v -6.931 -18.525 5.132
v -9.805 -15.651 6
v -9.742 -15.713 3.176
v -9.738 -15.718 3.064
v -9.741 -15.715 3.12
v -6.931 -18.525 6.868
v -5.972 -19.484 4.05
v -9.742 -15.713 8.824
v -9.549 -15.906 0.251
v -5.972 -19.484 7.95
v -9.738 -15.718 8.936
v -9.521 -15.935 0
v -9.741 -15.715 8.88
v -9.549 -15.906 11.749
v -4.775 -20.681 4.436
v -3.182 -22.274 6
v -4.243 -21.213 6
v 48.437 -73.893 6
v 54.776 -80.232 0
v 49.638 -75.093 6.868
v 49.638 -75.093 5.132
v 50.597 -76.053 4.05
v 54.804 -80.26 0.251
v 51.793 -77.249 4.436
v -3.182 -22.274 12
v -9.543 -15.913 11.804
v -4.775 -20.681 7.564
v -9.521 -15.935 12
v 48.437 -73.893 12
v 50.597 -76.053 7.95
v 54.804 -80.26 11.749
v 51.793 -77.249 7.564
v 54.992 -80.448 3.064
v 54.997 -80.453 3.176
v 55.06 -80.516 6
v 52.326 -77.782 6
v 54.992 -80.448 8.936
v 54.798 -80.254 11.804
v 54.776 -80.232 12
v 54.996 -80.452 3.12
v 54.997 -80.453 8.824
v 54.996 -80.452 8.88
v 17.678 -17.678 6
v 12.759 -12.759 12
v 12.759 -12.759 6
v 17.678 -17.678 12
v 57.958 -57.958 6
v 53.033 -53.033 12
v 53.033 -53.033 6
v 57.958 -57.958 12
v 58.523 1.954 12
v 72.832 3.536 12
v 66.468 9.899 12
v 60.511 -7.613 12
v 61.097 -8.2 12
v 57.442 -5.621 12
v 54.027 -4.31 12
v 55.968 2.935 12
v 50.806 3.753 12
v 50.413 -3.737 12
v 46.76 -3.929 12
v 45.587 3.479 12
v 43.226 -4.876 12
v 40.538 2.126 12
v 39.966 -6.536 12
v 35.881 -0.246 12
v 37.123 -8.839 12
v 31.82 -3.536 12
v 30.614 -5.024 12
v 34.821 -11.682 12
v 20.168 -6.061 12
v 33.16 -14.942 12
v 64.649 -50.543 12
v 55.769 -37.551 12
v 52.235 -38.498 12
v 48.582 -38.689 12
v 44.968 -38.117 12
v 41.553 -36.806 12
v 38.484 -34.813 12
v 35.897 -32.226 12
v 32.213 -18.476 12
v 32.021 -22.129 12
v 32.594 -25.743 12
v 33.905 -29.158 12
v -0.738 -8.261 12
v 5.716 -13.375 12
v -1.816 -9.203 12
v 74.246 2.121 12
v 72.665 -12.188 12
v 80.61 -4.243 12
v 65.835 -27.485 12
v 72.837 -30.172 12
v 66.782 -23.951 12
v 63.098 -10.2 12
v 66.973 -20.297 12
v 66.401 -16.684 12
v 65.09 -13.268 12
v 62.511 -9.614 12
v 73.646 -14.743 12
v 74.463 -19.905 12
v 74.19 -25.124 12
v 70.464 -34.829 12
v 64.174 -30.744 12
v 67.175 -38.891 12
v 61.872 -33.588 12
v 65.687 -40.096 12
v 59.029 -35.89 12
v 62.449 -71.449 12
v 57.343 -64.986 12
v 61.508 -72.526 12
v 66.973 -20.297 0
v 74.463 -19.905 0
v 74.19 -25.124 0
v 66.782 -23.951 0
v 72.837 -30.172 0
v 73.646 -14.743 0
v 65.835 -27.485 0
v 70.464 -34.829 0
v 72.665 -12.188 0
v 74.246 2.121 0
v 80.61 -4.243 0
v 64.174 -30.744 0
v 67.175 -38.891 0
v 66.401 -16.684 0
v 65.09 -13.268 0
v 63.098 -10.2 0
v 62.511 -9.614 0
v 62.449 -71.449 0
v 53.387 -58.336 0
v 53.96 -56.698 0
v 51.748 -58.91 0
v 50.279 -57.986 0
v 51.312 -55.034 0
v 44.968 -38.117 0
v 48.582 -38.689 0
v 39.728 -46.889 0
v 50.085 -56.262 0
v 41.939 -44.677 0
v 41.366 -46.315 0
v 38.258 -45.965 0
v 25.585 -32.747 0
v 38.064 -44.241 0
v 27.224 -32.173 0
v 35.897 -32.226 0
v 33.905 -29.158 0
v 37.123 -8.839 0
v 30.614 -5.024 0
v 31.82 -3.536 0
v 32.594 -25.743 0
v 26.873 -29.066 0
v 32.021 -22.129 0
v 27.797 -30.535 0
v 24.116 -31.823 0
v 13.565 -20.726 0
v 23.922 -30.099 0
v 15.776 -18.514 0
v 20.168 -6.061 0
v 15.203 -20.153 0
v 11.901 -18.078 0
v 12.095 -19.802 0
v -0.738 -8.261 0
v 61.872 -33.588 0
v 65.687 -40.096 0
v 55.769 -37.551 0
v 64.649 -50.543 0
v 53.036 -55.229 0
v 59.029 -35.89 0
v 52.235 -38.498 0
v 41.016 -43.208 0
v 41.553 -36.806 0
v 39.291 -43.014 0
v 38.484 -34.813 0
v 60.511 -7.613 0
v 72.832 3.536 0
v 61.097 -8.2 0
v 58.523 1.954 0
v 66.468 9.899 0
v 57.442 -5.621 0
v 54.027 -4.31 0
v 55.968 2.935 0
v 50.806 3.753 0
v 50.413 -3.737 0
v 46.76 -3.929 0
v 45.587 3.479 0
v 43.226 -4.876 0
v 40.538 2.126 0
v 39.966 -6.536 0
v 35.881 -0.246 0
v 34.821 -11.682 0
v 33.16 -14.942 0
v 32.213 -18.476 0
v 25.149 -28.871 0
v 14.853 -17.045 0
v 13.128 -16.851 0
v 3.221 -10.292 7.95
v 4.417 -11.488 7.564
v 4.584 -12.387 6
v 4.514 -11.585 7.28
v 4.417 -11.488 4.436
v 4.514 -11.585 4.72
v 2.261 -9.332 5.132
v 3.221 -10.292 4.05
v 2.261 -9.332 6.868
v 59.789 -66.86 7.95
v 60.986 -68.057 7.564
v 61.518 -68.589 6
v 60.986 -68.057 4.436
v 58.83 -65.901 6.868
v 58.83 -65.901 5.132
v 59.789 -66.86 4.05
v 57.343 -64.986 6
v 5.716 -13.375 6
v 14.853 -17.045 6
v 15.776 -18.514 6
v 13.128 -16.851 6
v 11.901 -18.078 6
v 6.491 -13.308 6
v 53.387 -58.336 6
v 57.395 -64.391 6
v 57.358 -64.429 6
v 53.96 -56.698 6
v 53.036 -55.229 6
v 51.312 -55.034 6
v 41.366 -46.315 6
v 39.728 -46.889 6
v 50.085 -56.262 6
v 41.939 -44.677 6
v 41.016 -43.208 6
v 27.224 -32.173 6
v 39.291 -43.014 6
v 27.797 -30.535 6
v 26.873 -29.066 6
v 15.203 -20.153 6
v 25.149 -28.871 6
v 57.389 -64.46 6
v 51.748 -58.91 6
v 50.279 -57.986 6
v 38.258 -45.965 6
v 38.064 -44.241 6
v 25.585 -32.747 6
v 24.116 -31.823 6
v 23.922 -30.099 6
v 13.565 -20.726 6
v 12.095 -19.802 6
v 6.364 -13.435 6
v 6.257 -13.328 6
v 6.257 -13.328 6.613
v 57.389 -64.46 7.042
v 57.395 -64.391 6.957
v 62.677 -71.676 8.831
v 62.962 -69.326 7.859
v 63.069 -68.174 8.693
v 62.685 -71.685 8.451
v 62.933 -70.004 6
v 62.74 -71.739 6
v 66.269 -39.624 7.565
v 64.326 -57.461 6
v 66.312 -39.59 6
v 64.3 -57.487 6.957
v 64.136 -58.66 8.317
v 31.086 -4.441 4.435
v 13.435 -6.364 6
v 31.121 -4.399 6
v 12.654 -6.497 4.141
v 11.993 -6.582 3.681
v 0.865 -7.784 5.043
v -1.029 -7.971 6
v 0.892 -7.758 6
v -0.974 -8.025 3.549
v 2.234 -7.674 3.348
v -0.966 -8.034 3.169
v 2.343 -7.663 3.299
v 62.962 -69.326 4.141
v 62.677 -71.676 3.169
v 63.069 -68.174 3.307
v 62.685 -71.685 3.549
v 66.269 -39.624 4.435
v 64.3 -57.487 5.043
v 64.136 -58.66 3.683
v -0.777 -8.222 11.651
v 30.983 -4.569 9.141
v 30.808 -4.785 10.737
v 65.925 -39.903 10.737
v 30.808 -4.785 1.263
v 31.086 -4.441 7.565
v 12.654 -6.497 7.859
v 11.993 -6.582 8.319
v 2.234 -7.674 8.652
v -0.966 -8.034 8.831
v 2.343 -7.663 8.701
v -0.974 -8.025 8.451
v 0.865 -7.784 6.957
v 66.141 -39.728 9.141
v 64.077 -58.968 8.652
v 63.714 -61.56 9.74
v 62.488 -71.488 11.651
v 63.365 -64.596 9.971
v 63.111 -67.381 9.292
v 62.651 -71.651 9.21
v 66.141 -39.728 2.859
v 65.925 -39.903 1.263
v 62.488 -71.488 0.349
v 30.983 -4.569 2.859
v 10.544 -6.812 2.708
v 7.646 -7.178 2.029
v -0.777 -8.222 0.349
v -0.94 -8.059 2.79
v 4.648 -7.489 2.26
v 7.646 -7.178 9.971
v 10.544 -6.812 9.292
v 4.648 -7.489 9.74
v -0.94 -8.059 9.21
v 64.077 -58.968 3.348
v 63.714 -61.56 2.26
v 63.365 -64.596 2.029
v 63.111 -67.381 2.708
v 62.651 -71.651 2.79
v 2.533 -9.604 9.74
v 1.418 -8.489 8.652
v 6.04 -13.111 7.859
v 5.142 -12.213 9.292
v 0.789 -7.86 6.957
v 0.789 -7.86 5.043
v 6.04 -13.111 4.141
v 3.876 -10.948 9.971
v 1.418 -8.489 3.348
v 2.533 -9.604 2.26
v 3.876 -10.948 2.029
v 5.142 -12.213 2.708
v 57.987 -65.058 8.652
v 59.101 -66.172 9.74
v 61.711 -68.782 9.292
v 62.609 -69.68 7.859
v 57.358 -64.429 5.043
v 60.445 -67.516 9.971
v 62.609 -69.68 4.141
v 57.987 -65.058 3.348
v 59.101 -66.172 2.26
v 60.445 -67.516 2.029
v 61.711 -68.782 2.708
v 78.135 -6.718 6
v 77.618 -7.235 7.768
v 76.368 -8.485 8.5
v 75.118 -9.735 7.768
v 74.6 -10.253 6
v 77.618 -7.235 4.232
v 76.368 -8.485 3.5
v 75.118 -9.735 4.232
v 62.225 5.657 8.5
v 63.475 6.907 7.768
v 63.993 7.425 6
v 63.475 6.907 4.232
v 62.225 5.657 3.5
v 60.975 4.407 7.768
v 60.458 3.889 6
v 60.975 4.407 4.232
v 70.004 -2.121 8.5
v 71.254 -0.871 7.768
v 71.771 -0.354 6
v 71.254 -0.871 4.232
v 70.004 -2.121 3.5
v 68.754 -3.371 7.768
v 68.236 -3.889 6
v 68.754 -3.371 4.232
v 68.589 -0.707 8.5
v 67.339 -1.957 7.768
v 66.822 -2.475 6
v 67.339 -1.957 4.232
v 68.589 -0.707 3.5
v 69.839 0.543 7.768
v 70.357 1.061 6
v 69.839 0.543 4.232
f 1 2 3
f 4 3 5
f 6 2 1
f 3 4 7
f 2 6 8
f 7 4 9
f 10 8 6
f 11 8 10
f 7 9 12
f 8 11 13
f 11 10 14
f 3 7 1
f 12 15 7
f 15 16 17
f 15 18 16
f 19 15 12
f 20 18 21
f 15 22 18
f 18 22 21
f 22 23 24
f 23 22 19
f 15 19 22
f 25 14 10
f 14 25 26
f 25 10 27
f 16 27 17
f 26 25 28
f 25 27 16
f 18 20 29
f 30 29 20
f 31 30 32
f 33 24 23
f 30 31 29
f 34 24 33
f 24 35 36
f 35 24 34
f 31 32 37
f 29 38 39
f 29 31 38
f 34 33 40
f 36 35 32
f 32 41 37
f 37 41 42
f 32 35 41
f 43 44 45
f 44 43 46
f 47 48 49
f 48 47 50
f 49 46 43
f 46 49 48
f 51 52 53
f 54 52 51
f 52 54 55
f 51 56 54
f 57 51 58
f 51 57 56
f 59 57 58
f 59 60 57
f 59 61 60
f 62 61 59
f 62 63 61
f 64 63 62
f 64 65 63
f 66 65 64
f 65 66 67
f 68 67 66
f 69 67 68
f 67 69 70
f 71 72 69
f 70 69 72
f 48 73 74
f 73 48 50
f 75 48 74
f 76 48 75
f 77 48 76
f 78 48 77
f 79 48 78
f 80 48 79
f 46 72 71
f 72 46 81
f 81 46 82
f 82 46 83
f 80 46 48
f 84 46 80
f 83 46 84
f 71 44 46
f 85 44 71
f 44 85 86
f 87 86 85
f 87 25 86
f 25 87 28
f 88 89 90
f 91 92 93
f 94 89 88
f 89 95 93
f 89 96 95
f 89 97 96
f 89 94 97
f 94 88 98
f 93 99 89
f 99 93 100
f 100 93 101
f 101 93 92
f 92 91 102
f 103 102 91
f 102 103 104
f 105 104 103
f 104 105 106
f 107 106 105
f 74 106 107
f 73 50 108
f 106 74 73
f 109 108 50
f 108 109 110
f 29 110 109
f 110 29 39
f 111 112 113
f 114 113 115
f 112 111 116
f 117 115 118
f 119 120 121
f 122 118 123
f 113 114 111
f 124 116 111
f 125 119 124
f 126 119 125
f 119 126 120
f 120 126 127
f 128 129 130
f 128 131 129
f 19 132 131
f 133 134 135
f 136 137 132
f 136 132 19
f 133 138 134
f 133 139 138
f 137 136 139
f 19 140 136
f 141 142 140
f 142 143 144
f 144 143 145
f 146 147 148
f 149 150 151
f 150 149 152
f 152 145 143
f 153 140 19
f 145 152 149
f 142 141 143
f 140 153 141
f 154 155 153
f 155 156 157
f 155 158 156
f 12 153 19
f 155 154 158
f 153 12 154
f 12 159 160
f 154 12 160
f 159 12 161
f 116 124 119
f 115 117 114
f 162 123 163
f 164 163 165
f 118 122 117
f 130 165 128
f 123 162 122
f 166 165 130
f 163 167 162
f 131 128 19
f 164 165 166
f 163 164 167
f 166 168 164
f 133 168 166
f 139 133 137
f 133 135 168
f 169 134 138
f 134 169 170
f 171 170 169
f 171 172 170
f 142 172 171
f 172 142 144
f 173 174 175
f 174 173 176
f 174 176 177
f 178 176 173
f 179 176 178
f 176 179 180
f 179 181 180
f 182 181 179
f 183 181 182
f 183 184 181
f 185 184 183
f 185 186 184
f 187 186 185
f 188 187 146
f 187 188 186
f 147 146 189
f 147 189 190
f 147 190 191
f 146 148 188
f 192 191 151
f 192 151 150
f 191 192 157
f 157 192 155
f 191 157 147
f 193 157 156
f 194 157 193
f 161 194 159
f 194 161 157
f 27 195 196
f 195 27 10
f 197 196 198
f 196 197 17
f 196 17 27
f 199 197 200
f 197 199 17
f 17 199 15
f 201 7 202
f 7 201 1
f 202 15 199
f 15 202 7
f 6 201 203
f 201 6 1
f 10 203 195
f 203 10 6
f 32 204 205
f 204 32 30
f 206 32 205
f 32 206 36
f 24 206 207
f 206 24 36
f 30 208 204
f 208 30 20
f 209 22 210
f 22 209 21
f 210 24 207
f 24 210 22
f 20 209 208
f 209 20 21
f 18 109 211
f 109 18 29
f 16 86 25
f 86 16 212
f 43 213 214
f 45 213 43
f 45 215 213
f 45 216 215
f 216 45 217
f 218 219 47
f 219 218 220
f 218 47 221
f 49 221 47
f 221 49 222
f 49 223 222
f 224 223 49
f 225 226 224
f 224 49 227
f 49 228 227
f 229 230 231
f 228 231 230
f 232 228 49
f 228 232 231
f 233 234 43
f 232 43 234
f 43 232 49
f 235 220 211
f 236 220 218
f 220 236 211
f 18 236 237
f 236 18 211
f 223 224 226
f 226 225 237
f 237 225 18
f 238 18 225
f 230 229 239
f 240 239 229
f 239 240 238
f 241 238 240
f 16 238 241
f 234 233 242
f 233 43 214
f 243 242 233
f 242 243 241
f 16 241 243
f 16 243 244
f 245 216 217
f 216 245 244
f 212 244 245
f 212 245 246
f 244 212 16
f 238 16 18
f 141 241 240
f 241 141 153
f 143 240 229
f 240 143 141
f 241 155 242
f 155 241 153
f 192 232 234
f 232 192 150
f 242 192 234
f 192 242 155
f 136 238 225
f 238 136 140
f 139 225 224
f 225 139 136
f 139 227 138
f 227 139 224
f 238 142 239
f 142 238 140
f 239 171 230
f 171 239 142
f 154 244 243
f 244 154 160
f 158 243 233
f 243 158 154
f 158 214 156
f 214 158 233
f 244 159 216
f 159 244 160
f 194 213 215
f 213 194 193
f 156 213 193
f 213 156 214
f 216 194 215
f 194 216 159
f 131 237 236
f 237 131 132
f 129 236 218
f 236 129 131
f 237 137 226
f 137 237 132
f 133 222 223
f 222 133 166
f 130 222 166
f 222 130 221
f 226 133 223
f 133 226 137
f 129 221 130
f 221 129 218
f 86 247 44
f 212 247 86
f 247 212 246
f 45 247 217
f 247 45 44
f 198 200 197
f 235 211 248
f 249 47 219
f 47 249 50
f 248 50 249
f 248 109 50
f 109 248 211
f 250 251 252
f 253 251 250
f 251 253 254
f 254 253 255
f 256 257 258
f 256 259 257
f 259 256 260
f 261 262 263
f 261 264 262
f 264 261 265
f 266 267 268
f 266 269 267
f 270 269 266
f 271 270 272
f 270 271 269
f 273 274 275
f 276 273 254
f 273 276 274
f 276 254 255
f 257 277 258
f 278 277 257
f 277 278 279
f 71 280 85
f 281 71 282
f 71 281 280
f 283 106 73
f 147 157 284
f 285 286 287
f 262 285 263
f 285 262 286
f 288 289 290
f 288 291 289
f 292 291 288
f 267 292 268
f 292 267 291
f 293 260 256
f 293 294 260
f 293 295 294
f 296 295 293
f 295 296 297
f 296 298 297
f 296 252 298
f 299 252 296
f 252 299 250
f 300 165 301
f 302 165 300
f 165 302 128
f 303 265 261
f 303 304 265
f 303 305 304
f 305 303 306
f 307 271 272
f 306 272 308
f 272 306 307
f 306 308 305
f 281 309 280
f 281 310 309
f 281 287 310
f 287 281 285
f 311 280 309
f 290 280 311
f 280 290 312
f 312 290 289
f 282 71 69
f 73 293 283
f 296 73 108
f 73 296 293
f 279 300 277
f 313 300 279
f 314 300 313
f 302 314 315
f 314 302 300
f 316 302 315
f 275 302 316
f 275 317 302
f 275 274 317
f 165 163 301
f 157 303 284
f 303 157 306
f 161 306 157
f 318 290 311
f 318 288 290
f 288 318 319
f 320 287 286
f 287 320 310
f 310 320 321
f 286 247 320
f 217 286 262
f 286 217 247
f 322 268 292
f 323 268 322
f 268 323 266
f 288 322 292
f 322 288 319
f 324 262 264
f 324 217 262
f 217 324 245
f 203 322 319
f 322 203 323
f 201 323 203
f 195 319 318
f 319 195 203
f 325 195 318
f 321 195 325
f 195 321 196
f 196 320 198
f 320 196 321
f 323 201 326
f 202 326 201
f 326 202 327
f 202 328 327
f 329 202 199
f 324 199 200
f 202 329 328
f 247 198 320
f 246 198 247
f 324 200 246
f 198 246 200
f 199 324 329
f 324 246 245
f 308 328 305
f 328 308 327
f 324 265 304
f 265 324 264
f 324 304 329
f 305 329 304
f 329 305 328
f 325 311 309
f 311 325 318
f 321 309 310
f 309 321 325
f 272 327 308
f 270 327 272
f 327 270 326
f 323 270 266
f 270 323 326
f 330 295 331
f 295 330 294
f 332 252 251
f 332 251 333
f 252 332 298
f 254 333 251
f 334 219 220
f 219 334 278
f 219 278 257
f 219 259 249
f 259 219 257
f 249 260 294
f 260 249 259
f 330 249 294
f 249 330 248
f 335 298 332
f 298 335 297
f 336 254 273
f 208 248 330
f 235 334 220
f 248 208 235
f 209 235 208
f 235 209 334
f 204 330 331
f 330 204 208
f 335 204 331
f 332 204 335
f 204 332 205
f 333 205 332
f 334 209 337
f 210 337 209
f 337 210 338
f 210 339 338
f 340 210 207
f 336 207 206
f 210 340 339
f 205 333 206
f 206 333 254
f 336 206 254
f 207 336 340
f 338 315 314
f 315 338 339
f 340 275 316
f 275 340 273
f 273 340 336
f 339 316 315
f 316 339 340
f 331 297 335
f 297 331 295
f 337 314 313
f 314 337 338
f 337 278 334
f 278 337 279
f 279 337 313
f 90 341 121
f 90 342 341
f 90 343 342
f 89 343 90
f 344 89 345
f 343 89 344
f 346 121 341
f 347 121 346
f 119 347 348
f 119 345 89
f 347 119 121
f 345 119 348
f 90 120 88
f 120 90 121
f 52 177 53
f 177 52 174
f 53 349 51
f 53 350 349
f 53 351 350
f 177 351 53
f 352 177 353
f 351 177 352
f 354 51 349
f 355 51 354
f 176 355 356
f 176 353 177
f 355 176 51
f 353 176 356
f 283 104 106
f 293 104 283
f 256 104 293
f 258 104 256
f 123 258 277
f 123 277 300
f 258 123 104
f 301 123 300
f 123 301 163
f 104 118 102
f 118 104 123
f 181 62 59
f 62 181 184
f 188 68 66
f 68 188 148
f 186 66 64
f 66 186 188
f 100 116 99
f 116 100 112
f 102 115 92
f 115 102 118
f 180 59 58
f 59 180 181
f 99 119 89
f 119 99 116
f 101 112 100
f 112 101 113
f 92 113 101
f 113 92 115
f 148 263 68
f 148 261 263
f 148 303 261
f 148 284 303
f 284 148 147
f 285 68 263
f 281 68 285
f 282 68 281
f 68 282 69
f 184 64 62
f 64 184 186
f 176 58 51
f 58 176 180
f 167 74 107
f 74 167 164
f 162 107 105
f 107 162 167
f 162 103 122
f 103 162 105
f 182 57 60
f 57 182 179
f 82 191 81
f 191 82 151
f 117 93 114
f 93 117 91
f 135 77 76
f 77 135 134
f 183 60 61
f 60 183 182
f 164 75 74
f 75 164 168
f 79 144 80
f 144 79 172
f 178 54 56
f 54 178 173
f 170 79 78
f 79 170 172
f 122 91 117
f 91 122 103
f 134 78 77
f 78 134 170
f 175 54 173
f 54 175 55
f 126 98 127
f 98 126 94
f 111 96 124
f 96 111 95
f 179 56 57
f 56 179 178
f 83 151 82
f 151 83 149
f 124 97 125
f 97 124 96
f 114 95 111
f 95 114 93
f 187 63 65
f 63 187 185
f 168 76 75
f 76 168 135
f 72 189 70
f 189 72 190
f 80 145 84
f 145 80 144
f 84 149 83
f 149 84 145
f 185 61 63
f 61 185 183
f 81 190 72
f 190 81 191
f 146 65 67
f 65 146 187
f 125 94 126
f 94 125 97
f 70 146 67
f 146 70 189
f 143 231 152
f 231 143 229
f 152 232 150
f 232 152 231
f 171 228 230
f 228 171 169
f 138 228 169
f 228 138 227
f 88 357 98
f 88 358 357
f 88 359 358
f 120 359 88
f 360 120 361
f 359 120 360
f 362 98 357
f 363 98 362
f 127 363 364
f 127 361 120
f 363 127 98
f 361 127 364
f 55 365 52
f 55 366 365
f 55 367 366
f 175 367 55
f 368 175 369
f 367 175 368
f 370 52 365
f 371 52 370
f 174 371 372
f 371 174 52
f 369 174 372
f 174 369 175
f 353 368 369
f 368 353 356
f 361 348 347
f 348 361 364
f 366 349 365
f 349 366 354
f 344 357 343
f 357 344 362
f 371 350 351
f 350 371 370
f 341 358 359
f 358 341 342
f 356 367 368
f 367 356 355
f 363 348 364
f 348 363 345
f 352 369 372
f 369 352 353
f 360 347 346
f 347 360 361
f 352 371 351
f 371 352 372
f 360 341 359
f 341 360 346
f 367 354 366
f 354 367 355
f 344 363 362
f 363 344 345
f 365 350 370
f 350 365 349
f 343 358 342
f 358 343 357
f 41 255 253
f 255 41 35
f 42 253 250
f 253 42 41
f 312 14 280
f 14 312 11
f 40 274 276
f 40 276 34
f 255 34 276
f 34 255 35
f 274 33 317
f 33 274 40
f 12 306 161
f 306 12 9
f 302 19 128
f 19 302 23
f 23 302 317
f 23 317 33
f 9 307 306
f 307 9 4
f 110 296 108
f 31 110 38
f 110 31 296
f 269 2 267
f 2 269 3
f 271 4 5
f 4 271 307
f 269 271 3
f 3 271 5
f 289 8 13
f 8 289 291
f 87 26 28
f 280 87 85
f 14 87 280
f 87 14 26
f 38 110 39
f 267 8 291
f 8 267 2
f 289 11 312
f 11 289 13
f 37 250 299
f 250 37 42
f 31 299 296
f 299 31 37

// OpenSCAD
rotate([90,0,-45]) 
intersection() {
	difference() {
		union() {
			difference() {
				intersection() {
					union() {
						difference() {
							cube([100,12,18]);
							translate([10,6,-1])cylinder(20,2,2);
							translate([90,6,-1])cylinder(20,2,2);
							translate([13.5,6,-1])cube([73,6.1,120]);
							translate([40,13,3.5])rotate([90,0,0])cylinder(14,2,2);
							translate([60,13,3.5])rotate([90,0,0])cylinder(14,2,2);
							translate([23,13,3.5])rotate([90,0,0])cylinder(14,2,2);
							translate([77,13,3.5])rotate([90,0,0])cylinder(14,2,2);
//							translate([0,-1,14])#cube([100,2,6]);
//							translate([0,11,14])#cube([100,2,6]);
						}
						translate([10,0,-30]) cube([80,12,30]);
						translate([9,0,3])rotate([0,50,0])cube([10,12,5]);
						translate([87,0,6])rotate([0,130,0])cube([10,12,5]);
					}
					translate([50,6,-50]) cylinder(70,0,56,$fn=100);
				}
				translate([10,6,-15])cylinder(20,4,4);
				translate([90,6,-15])cylinder(20,4,4);
			}
			translate([40,0,-54]) cube([20,12,20]);
			translate([50,12,-20])rotate([90,0,0])cylinder(12,25,25);
		}
		translate([25,6,0])cube([50,6.1,12]);
		translate([50,20,-20])rotate([90,0,0])cylinder(30,17.5,17.5);
		translate([40,13,3.5])rotate([90,0,0])cylinder(14,2,2);
		translate([60,13,3.5])rotate([90,0,0])cylinder(14,2,2);
		translate([49,-1,-55]) cube([2,14,22]);
		translate([39,6,-48])rotate([0,90,0])cylinder(22,2.5,2.5);
	}
	translate([50,6,-70]) cylinder(90,40,46,$fn=100);
}
